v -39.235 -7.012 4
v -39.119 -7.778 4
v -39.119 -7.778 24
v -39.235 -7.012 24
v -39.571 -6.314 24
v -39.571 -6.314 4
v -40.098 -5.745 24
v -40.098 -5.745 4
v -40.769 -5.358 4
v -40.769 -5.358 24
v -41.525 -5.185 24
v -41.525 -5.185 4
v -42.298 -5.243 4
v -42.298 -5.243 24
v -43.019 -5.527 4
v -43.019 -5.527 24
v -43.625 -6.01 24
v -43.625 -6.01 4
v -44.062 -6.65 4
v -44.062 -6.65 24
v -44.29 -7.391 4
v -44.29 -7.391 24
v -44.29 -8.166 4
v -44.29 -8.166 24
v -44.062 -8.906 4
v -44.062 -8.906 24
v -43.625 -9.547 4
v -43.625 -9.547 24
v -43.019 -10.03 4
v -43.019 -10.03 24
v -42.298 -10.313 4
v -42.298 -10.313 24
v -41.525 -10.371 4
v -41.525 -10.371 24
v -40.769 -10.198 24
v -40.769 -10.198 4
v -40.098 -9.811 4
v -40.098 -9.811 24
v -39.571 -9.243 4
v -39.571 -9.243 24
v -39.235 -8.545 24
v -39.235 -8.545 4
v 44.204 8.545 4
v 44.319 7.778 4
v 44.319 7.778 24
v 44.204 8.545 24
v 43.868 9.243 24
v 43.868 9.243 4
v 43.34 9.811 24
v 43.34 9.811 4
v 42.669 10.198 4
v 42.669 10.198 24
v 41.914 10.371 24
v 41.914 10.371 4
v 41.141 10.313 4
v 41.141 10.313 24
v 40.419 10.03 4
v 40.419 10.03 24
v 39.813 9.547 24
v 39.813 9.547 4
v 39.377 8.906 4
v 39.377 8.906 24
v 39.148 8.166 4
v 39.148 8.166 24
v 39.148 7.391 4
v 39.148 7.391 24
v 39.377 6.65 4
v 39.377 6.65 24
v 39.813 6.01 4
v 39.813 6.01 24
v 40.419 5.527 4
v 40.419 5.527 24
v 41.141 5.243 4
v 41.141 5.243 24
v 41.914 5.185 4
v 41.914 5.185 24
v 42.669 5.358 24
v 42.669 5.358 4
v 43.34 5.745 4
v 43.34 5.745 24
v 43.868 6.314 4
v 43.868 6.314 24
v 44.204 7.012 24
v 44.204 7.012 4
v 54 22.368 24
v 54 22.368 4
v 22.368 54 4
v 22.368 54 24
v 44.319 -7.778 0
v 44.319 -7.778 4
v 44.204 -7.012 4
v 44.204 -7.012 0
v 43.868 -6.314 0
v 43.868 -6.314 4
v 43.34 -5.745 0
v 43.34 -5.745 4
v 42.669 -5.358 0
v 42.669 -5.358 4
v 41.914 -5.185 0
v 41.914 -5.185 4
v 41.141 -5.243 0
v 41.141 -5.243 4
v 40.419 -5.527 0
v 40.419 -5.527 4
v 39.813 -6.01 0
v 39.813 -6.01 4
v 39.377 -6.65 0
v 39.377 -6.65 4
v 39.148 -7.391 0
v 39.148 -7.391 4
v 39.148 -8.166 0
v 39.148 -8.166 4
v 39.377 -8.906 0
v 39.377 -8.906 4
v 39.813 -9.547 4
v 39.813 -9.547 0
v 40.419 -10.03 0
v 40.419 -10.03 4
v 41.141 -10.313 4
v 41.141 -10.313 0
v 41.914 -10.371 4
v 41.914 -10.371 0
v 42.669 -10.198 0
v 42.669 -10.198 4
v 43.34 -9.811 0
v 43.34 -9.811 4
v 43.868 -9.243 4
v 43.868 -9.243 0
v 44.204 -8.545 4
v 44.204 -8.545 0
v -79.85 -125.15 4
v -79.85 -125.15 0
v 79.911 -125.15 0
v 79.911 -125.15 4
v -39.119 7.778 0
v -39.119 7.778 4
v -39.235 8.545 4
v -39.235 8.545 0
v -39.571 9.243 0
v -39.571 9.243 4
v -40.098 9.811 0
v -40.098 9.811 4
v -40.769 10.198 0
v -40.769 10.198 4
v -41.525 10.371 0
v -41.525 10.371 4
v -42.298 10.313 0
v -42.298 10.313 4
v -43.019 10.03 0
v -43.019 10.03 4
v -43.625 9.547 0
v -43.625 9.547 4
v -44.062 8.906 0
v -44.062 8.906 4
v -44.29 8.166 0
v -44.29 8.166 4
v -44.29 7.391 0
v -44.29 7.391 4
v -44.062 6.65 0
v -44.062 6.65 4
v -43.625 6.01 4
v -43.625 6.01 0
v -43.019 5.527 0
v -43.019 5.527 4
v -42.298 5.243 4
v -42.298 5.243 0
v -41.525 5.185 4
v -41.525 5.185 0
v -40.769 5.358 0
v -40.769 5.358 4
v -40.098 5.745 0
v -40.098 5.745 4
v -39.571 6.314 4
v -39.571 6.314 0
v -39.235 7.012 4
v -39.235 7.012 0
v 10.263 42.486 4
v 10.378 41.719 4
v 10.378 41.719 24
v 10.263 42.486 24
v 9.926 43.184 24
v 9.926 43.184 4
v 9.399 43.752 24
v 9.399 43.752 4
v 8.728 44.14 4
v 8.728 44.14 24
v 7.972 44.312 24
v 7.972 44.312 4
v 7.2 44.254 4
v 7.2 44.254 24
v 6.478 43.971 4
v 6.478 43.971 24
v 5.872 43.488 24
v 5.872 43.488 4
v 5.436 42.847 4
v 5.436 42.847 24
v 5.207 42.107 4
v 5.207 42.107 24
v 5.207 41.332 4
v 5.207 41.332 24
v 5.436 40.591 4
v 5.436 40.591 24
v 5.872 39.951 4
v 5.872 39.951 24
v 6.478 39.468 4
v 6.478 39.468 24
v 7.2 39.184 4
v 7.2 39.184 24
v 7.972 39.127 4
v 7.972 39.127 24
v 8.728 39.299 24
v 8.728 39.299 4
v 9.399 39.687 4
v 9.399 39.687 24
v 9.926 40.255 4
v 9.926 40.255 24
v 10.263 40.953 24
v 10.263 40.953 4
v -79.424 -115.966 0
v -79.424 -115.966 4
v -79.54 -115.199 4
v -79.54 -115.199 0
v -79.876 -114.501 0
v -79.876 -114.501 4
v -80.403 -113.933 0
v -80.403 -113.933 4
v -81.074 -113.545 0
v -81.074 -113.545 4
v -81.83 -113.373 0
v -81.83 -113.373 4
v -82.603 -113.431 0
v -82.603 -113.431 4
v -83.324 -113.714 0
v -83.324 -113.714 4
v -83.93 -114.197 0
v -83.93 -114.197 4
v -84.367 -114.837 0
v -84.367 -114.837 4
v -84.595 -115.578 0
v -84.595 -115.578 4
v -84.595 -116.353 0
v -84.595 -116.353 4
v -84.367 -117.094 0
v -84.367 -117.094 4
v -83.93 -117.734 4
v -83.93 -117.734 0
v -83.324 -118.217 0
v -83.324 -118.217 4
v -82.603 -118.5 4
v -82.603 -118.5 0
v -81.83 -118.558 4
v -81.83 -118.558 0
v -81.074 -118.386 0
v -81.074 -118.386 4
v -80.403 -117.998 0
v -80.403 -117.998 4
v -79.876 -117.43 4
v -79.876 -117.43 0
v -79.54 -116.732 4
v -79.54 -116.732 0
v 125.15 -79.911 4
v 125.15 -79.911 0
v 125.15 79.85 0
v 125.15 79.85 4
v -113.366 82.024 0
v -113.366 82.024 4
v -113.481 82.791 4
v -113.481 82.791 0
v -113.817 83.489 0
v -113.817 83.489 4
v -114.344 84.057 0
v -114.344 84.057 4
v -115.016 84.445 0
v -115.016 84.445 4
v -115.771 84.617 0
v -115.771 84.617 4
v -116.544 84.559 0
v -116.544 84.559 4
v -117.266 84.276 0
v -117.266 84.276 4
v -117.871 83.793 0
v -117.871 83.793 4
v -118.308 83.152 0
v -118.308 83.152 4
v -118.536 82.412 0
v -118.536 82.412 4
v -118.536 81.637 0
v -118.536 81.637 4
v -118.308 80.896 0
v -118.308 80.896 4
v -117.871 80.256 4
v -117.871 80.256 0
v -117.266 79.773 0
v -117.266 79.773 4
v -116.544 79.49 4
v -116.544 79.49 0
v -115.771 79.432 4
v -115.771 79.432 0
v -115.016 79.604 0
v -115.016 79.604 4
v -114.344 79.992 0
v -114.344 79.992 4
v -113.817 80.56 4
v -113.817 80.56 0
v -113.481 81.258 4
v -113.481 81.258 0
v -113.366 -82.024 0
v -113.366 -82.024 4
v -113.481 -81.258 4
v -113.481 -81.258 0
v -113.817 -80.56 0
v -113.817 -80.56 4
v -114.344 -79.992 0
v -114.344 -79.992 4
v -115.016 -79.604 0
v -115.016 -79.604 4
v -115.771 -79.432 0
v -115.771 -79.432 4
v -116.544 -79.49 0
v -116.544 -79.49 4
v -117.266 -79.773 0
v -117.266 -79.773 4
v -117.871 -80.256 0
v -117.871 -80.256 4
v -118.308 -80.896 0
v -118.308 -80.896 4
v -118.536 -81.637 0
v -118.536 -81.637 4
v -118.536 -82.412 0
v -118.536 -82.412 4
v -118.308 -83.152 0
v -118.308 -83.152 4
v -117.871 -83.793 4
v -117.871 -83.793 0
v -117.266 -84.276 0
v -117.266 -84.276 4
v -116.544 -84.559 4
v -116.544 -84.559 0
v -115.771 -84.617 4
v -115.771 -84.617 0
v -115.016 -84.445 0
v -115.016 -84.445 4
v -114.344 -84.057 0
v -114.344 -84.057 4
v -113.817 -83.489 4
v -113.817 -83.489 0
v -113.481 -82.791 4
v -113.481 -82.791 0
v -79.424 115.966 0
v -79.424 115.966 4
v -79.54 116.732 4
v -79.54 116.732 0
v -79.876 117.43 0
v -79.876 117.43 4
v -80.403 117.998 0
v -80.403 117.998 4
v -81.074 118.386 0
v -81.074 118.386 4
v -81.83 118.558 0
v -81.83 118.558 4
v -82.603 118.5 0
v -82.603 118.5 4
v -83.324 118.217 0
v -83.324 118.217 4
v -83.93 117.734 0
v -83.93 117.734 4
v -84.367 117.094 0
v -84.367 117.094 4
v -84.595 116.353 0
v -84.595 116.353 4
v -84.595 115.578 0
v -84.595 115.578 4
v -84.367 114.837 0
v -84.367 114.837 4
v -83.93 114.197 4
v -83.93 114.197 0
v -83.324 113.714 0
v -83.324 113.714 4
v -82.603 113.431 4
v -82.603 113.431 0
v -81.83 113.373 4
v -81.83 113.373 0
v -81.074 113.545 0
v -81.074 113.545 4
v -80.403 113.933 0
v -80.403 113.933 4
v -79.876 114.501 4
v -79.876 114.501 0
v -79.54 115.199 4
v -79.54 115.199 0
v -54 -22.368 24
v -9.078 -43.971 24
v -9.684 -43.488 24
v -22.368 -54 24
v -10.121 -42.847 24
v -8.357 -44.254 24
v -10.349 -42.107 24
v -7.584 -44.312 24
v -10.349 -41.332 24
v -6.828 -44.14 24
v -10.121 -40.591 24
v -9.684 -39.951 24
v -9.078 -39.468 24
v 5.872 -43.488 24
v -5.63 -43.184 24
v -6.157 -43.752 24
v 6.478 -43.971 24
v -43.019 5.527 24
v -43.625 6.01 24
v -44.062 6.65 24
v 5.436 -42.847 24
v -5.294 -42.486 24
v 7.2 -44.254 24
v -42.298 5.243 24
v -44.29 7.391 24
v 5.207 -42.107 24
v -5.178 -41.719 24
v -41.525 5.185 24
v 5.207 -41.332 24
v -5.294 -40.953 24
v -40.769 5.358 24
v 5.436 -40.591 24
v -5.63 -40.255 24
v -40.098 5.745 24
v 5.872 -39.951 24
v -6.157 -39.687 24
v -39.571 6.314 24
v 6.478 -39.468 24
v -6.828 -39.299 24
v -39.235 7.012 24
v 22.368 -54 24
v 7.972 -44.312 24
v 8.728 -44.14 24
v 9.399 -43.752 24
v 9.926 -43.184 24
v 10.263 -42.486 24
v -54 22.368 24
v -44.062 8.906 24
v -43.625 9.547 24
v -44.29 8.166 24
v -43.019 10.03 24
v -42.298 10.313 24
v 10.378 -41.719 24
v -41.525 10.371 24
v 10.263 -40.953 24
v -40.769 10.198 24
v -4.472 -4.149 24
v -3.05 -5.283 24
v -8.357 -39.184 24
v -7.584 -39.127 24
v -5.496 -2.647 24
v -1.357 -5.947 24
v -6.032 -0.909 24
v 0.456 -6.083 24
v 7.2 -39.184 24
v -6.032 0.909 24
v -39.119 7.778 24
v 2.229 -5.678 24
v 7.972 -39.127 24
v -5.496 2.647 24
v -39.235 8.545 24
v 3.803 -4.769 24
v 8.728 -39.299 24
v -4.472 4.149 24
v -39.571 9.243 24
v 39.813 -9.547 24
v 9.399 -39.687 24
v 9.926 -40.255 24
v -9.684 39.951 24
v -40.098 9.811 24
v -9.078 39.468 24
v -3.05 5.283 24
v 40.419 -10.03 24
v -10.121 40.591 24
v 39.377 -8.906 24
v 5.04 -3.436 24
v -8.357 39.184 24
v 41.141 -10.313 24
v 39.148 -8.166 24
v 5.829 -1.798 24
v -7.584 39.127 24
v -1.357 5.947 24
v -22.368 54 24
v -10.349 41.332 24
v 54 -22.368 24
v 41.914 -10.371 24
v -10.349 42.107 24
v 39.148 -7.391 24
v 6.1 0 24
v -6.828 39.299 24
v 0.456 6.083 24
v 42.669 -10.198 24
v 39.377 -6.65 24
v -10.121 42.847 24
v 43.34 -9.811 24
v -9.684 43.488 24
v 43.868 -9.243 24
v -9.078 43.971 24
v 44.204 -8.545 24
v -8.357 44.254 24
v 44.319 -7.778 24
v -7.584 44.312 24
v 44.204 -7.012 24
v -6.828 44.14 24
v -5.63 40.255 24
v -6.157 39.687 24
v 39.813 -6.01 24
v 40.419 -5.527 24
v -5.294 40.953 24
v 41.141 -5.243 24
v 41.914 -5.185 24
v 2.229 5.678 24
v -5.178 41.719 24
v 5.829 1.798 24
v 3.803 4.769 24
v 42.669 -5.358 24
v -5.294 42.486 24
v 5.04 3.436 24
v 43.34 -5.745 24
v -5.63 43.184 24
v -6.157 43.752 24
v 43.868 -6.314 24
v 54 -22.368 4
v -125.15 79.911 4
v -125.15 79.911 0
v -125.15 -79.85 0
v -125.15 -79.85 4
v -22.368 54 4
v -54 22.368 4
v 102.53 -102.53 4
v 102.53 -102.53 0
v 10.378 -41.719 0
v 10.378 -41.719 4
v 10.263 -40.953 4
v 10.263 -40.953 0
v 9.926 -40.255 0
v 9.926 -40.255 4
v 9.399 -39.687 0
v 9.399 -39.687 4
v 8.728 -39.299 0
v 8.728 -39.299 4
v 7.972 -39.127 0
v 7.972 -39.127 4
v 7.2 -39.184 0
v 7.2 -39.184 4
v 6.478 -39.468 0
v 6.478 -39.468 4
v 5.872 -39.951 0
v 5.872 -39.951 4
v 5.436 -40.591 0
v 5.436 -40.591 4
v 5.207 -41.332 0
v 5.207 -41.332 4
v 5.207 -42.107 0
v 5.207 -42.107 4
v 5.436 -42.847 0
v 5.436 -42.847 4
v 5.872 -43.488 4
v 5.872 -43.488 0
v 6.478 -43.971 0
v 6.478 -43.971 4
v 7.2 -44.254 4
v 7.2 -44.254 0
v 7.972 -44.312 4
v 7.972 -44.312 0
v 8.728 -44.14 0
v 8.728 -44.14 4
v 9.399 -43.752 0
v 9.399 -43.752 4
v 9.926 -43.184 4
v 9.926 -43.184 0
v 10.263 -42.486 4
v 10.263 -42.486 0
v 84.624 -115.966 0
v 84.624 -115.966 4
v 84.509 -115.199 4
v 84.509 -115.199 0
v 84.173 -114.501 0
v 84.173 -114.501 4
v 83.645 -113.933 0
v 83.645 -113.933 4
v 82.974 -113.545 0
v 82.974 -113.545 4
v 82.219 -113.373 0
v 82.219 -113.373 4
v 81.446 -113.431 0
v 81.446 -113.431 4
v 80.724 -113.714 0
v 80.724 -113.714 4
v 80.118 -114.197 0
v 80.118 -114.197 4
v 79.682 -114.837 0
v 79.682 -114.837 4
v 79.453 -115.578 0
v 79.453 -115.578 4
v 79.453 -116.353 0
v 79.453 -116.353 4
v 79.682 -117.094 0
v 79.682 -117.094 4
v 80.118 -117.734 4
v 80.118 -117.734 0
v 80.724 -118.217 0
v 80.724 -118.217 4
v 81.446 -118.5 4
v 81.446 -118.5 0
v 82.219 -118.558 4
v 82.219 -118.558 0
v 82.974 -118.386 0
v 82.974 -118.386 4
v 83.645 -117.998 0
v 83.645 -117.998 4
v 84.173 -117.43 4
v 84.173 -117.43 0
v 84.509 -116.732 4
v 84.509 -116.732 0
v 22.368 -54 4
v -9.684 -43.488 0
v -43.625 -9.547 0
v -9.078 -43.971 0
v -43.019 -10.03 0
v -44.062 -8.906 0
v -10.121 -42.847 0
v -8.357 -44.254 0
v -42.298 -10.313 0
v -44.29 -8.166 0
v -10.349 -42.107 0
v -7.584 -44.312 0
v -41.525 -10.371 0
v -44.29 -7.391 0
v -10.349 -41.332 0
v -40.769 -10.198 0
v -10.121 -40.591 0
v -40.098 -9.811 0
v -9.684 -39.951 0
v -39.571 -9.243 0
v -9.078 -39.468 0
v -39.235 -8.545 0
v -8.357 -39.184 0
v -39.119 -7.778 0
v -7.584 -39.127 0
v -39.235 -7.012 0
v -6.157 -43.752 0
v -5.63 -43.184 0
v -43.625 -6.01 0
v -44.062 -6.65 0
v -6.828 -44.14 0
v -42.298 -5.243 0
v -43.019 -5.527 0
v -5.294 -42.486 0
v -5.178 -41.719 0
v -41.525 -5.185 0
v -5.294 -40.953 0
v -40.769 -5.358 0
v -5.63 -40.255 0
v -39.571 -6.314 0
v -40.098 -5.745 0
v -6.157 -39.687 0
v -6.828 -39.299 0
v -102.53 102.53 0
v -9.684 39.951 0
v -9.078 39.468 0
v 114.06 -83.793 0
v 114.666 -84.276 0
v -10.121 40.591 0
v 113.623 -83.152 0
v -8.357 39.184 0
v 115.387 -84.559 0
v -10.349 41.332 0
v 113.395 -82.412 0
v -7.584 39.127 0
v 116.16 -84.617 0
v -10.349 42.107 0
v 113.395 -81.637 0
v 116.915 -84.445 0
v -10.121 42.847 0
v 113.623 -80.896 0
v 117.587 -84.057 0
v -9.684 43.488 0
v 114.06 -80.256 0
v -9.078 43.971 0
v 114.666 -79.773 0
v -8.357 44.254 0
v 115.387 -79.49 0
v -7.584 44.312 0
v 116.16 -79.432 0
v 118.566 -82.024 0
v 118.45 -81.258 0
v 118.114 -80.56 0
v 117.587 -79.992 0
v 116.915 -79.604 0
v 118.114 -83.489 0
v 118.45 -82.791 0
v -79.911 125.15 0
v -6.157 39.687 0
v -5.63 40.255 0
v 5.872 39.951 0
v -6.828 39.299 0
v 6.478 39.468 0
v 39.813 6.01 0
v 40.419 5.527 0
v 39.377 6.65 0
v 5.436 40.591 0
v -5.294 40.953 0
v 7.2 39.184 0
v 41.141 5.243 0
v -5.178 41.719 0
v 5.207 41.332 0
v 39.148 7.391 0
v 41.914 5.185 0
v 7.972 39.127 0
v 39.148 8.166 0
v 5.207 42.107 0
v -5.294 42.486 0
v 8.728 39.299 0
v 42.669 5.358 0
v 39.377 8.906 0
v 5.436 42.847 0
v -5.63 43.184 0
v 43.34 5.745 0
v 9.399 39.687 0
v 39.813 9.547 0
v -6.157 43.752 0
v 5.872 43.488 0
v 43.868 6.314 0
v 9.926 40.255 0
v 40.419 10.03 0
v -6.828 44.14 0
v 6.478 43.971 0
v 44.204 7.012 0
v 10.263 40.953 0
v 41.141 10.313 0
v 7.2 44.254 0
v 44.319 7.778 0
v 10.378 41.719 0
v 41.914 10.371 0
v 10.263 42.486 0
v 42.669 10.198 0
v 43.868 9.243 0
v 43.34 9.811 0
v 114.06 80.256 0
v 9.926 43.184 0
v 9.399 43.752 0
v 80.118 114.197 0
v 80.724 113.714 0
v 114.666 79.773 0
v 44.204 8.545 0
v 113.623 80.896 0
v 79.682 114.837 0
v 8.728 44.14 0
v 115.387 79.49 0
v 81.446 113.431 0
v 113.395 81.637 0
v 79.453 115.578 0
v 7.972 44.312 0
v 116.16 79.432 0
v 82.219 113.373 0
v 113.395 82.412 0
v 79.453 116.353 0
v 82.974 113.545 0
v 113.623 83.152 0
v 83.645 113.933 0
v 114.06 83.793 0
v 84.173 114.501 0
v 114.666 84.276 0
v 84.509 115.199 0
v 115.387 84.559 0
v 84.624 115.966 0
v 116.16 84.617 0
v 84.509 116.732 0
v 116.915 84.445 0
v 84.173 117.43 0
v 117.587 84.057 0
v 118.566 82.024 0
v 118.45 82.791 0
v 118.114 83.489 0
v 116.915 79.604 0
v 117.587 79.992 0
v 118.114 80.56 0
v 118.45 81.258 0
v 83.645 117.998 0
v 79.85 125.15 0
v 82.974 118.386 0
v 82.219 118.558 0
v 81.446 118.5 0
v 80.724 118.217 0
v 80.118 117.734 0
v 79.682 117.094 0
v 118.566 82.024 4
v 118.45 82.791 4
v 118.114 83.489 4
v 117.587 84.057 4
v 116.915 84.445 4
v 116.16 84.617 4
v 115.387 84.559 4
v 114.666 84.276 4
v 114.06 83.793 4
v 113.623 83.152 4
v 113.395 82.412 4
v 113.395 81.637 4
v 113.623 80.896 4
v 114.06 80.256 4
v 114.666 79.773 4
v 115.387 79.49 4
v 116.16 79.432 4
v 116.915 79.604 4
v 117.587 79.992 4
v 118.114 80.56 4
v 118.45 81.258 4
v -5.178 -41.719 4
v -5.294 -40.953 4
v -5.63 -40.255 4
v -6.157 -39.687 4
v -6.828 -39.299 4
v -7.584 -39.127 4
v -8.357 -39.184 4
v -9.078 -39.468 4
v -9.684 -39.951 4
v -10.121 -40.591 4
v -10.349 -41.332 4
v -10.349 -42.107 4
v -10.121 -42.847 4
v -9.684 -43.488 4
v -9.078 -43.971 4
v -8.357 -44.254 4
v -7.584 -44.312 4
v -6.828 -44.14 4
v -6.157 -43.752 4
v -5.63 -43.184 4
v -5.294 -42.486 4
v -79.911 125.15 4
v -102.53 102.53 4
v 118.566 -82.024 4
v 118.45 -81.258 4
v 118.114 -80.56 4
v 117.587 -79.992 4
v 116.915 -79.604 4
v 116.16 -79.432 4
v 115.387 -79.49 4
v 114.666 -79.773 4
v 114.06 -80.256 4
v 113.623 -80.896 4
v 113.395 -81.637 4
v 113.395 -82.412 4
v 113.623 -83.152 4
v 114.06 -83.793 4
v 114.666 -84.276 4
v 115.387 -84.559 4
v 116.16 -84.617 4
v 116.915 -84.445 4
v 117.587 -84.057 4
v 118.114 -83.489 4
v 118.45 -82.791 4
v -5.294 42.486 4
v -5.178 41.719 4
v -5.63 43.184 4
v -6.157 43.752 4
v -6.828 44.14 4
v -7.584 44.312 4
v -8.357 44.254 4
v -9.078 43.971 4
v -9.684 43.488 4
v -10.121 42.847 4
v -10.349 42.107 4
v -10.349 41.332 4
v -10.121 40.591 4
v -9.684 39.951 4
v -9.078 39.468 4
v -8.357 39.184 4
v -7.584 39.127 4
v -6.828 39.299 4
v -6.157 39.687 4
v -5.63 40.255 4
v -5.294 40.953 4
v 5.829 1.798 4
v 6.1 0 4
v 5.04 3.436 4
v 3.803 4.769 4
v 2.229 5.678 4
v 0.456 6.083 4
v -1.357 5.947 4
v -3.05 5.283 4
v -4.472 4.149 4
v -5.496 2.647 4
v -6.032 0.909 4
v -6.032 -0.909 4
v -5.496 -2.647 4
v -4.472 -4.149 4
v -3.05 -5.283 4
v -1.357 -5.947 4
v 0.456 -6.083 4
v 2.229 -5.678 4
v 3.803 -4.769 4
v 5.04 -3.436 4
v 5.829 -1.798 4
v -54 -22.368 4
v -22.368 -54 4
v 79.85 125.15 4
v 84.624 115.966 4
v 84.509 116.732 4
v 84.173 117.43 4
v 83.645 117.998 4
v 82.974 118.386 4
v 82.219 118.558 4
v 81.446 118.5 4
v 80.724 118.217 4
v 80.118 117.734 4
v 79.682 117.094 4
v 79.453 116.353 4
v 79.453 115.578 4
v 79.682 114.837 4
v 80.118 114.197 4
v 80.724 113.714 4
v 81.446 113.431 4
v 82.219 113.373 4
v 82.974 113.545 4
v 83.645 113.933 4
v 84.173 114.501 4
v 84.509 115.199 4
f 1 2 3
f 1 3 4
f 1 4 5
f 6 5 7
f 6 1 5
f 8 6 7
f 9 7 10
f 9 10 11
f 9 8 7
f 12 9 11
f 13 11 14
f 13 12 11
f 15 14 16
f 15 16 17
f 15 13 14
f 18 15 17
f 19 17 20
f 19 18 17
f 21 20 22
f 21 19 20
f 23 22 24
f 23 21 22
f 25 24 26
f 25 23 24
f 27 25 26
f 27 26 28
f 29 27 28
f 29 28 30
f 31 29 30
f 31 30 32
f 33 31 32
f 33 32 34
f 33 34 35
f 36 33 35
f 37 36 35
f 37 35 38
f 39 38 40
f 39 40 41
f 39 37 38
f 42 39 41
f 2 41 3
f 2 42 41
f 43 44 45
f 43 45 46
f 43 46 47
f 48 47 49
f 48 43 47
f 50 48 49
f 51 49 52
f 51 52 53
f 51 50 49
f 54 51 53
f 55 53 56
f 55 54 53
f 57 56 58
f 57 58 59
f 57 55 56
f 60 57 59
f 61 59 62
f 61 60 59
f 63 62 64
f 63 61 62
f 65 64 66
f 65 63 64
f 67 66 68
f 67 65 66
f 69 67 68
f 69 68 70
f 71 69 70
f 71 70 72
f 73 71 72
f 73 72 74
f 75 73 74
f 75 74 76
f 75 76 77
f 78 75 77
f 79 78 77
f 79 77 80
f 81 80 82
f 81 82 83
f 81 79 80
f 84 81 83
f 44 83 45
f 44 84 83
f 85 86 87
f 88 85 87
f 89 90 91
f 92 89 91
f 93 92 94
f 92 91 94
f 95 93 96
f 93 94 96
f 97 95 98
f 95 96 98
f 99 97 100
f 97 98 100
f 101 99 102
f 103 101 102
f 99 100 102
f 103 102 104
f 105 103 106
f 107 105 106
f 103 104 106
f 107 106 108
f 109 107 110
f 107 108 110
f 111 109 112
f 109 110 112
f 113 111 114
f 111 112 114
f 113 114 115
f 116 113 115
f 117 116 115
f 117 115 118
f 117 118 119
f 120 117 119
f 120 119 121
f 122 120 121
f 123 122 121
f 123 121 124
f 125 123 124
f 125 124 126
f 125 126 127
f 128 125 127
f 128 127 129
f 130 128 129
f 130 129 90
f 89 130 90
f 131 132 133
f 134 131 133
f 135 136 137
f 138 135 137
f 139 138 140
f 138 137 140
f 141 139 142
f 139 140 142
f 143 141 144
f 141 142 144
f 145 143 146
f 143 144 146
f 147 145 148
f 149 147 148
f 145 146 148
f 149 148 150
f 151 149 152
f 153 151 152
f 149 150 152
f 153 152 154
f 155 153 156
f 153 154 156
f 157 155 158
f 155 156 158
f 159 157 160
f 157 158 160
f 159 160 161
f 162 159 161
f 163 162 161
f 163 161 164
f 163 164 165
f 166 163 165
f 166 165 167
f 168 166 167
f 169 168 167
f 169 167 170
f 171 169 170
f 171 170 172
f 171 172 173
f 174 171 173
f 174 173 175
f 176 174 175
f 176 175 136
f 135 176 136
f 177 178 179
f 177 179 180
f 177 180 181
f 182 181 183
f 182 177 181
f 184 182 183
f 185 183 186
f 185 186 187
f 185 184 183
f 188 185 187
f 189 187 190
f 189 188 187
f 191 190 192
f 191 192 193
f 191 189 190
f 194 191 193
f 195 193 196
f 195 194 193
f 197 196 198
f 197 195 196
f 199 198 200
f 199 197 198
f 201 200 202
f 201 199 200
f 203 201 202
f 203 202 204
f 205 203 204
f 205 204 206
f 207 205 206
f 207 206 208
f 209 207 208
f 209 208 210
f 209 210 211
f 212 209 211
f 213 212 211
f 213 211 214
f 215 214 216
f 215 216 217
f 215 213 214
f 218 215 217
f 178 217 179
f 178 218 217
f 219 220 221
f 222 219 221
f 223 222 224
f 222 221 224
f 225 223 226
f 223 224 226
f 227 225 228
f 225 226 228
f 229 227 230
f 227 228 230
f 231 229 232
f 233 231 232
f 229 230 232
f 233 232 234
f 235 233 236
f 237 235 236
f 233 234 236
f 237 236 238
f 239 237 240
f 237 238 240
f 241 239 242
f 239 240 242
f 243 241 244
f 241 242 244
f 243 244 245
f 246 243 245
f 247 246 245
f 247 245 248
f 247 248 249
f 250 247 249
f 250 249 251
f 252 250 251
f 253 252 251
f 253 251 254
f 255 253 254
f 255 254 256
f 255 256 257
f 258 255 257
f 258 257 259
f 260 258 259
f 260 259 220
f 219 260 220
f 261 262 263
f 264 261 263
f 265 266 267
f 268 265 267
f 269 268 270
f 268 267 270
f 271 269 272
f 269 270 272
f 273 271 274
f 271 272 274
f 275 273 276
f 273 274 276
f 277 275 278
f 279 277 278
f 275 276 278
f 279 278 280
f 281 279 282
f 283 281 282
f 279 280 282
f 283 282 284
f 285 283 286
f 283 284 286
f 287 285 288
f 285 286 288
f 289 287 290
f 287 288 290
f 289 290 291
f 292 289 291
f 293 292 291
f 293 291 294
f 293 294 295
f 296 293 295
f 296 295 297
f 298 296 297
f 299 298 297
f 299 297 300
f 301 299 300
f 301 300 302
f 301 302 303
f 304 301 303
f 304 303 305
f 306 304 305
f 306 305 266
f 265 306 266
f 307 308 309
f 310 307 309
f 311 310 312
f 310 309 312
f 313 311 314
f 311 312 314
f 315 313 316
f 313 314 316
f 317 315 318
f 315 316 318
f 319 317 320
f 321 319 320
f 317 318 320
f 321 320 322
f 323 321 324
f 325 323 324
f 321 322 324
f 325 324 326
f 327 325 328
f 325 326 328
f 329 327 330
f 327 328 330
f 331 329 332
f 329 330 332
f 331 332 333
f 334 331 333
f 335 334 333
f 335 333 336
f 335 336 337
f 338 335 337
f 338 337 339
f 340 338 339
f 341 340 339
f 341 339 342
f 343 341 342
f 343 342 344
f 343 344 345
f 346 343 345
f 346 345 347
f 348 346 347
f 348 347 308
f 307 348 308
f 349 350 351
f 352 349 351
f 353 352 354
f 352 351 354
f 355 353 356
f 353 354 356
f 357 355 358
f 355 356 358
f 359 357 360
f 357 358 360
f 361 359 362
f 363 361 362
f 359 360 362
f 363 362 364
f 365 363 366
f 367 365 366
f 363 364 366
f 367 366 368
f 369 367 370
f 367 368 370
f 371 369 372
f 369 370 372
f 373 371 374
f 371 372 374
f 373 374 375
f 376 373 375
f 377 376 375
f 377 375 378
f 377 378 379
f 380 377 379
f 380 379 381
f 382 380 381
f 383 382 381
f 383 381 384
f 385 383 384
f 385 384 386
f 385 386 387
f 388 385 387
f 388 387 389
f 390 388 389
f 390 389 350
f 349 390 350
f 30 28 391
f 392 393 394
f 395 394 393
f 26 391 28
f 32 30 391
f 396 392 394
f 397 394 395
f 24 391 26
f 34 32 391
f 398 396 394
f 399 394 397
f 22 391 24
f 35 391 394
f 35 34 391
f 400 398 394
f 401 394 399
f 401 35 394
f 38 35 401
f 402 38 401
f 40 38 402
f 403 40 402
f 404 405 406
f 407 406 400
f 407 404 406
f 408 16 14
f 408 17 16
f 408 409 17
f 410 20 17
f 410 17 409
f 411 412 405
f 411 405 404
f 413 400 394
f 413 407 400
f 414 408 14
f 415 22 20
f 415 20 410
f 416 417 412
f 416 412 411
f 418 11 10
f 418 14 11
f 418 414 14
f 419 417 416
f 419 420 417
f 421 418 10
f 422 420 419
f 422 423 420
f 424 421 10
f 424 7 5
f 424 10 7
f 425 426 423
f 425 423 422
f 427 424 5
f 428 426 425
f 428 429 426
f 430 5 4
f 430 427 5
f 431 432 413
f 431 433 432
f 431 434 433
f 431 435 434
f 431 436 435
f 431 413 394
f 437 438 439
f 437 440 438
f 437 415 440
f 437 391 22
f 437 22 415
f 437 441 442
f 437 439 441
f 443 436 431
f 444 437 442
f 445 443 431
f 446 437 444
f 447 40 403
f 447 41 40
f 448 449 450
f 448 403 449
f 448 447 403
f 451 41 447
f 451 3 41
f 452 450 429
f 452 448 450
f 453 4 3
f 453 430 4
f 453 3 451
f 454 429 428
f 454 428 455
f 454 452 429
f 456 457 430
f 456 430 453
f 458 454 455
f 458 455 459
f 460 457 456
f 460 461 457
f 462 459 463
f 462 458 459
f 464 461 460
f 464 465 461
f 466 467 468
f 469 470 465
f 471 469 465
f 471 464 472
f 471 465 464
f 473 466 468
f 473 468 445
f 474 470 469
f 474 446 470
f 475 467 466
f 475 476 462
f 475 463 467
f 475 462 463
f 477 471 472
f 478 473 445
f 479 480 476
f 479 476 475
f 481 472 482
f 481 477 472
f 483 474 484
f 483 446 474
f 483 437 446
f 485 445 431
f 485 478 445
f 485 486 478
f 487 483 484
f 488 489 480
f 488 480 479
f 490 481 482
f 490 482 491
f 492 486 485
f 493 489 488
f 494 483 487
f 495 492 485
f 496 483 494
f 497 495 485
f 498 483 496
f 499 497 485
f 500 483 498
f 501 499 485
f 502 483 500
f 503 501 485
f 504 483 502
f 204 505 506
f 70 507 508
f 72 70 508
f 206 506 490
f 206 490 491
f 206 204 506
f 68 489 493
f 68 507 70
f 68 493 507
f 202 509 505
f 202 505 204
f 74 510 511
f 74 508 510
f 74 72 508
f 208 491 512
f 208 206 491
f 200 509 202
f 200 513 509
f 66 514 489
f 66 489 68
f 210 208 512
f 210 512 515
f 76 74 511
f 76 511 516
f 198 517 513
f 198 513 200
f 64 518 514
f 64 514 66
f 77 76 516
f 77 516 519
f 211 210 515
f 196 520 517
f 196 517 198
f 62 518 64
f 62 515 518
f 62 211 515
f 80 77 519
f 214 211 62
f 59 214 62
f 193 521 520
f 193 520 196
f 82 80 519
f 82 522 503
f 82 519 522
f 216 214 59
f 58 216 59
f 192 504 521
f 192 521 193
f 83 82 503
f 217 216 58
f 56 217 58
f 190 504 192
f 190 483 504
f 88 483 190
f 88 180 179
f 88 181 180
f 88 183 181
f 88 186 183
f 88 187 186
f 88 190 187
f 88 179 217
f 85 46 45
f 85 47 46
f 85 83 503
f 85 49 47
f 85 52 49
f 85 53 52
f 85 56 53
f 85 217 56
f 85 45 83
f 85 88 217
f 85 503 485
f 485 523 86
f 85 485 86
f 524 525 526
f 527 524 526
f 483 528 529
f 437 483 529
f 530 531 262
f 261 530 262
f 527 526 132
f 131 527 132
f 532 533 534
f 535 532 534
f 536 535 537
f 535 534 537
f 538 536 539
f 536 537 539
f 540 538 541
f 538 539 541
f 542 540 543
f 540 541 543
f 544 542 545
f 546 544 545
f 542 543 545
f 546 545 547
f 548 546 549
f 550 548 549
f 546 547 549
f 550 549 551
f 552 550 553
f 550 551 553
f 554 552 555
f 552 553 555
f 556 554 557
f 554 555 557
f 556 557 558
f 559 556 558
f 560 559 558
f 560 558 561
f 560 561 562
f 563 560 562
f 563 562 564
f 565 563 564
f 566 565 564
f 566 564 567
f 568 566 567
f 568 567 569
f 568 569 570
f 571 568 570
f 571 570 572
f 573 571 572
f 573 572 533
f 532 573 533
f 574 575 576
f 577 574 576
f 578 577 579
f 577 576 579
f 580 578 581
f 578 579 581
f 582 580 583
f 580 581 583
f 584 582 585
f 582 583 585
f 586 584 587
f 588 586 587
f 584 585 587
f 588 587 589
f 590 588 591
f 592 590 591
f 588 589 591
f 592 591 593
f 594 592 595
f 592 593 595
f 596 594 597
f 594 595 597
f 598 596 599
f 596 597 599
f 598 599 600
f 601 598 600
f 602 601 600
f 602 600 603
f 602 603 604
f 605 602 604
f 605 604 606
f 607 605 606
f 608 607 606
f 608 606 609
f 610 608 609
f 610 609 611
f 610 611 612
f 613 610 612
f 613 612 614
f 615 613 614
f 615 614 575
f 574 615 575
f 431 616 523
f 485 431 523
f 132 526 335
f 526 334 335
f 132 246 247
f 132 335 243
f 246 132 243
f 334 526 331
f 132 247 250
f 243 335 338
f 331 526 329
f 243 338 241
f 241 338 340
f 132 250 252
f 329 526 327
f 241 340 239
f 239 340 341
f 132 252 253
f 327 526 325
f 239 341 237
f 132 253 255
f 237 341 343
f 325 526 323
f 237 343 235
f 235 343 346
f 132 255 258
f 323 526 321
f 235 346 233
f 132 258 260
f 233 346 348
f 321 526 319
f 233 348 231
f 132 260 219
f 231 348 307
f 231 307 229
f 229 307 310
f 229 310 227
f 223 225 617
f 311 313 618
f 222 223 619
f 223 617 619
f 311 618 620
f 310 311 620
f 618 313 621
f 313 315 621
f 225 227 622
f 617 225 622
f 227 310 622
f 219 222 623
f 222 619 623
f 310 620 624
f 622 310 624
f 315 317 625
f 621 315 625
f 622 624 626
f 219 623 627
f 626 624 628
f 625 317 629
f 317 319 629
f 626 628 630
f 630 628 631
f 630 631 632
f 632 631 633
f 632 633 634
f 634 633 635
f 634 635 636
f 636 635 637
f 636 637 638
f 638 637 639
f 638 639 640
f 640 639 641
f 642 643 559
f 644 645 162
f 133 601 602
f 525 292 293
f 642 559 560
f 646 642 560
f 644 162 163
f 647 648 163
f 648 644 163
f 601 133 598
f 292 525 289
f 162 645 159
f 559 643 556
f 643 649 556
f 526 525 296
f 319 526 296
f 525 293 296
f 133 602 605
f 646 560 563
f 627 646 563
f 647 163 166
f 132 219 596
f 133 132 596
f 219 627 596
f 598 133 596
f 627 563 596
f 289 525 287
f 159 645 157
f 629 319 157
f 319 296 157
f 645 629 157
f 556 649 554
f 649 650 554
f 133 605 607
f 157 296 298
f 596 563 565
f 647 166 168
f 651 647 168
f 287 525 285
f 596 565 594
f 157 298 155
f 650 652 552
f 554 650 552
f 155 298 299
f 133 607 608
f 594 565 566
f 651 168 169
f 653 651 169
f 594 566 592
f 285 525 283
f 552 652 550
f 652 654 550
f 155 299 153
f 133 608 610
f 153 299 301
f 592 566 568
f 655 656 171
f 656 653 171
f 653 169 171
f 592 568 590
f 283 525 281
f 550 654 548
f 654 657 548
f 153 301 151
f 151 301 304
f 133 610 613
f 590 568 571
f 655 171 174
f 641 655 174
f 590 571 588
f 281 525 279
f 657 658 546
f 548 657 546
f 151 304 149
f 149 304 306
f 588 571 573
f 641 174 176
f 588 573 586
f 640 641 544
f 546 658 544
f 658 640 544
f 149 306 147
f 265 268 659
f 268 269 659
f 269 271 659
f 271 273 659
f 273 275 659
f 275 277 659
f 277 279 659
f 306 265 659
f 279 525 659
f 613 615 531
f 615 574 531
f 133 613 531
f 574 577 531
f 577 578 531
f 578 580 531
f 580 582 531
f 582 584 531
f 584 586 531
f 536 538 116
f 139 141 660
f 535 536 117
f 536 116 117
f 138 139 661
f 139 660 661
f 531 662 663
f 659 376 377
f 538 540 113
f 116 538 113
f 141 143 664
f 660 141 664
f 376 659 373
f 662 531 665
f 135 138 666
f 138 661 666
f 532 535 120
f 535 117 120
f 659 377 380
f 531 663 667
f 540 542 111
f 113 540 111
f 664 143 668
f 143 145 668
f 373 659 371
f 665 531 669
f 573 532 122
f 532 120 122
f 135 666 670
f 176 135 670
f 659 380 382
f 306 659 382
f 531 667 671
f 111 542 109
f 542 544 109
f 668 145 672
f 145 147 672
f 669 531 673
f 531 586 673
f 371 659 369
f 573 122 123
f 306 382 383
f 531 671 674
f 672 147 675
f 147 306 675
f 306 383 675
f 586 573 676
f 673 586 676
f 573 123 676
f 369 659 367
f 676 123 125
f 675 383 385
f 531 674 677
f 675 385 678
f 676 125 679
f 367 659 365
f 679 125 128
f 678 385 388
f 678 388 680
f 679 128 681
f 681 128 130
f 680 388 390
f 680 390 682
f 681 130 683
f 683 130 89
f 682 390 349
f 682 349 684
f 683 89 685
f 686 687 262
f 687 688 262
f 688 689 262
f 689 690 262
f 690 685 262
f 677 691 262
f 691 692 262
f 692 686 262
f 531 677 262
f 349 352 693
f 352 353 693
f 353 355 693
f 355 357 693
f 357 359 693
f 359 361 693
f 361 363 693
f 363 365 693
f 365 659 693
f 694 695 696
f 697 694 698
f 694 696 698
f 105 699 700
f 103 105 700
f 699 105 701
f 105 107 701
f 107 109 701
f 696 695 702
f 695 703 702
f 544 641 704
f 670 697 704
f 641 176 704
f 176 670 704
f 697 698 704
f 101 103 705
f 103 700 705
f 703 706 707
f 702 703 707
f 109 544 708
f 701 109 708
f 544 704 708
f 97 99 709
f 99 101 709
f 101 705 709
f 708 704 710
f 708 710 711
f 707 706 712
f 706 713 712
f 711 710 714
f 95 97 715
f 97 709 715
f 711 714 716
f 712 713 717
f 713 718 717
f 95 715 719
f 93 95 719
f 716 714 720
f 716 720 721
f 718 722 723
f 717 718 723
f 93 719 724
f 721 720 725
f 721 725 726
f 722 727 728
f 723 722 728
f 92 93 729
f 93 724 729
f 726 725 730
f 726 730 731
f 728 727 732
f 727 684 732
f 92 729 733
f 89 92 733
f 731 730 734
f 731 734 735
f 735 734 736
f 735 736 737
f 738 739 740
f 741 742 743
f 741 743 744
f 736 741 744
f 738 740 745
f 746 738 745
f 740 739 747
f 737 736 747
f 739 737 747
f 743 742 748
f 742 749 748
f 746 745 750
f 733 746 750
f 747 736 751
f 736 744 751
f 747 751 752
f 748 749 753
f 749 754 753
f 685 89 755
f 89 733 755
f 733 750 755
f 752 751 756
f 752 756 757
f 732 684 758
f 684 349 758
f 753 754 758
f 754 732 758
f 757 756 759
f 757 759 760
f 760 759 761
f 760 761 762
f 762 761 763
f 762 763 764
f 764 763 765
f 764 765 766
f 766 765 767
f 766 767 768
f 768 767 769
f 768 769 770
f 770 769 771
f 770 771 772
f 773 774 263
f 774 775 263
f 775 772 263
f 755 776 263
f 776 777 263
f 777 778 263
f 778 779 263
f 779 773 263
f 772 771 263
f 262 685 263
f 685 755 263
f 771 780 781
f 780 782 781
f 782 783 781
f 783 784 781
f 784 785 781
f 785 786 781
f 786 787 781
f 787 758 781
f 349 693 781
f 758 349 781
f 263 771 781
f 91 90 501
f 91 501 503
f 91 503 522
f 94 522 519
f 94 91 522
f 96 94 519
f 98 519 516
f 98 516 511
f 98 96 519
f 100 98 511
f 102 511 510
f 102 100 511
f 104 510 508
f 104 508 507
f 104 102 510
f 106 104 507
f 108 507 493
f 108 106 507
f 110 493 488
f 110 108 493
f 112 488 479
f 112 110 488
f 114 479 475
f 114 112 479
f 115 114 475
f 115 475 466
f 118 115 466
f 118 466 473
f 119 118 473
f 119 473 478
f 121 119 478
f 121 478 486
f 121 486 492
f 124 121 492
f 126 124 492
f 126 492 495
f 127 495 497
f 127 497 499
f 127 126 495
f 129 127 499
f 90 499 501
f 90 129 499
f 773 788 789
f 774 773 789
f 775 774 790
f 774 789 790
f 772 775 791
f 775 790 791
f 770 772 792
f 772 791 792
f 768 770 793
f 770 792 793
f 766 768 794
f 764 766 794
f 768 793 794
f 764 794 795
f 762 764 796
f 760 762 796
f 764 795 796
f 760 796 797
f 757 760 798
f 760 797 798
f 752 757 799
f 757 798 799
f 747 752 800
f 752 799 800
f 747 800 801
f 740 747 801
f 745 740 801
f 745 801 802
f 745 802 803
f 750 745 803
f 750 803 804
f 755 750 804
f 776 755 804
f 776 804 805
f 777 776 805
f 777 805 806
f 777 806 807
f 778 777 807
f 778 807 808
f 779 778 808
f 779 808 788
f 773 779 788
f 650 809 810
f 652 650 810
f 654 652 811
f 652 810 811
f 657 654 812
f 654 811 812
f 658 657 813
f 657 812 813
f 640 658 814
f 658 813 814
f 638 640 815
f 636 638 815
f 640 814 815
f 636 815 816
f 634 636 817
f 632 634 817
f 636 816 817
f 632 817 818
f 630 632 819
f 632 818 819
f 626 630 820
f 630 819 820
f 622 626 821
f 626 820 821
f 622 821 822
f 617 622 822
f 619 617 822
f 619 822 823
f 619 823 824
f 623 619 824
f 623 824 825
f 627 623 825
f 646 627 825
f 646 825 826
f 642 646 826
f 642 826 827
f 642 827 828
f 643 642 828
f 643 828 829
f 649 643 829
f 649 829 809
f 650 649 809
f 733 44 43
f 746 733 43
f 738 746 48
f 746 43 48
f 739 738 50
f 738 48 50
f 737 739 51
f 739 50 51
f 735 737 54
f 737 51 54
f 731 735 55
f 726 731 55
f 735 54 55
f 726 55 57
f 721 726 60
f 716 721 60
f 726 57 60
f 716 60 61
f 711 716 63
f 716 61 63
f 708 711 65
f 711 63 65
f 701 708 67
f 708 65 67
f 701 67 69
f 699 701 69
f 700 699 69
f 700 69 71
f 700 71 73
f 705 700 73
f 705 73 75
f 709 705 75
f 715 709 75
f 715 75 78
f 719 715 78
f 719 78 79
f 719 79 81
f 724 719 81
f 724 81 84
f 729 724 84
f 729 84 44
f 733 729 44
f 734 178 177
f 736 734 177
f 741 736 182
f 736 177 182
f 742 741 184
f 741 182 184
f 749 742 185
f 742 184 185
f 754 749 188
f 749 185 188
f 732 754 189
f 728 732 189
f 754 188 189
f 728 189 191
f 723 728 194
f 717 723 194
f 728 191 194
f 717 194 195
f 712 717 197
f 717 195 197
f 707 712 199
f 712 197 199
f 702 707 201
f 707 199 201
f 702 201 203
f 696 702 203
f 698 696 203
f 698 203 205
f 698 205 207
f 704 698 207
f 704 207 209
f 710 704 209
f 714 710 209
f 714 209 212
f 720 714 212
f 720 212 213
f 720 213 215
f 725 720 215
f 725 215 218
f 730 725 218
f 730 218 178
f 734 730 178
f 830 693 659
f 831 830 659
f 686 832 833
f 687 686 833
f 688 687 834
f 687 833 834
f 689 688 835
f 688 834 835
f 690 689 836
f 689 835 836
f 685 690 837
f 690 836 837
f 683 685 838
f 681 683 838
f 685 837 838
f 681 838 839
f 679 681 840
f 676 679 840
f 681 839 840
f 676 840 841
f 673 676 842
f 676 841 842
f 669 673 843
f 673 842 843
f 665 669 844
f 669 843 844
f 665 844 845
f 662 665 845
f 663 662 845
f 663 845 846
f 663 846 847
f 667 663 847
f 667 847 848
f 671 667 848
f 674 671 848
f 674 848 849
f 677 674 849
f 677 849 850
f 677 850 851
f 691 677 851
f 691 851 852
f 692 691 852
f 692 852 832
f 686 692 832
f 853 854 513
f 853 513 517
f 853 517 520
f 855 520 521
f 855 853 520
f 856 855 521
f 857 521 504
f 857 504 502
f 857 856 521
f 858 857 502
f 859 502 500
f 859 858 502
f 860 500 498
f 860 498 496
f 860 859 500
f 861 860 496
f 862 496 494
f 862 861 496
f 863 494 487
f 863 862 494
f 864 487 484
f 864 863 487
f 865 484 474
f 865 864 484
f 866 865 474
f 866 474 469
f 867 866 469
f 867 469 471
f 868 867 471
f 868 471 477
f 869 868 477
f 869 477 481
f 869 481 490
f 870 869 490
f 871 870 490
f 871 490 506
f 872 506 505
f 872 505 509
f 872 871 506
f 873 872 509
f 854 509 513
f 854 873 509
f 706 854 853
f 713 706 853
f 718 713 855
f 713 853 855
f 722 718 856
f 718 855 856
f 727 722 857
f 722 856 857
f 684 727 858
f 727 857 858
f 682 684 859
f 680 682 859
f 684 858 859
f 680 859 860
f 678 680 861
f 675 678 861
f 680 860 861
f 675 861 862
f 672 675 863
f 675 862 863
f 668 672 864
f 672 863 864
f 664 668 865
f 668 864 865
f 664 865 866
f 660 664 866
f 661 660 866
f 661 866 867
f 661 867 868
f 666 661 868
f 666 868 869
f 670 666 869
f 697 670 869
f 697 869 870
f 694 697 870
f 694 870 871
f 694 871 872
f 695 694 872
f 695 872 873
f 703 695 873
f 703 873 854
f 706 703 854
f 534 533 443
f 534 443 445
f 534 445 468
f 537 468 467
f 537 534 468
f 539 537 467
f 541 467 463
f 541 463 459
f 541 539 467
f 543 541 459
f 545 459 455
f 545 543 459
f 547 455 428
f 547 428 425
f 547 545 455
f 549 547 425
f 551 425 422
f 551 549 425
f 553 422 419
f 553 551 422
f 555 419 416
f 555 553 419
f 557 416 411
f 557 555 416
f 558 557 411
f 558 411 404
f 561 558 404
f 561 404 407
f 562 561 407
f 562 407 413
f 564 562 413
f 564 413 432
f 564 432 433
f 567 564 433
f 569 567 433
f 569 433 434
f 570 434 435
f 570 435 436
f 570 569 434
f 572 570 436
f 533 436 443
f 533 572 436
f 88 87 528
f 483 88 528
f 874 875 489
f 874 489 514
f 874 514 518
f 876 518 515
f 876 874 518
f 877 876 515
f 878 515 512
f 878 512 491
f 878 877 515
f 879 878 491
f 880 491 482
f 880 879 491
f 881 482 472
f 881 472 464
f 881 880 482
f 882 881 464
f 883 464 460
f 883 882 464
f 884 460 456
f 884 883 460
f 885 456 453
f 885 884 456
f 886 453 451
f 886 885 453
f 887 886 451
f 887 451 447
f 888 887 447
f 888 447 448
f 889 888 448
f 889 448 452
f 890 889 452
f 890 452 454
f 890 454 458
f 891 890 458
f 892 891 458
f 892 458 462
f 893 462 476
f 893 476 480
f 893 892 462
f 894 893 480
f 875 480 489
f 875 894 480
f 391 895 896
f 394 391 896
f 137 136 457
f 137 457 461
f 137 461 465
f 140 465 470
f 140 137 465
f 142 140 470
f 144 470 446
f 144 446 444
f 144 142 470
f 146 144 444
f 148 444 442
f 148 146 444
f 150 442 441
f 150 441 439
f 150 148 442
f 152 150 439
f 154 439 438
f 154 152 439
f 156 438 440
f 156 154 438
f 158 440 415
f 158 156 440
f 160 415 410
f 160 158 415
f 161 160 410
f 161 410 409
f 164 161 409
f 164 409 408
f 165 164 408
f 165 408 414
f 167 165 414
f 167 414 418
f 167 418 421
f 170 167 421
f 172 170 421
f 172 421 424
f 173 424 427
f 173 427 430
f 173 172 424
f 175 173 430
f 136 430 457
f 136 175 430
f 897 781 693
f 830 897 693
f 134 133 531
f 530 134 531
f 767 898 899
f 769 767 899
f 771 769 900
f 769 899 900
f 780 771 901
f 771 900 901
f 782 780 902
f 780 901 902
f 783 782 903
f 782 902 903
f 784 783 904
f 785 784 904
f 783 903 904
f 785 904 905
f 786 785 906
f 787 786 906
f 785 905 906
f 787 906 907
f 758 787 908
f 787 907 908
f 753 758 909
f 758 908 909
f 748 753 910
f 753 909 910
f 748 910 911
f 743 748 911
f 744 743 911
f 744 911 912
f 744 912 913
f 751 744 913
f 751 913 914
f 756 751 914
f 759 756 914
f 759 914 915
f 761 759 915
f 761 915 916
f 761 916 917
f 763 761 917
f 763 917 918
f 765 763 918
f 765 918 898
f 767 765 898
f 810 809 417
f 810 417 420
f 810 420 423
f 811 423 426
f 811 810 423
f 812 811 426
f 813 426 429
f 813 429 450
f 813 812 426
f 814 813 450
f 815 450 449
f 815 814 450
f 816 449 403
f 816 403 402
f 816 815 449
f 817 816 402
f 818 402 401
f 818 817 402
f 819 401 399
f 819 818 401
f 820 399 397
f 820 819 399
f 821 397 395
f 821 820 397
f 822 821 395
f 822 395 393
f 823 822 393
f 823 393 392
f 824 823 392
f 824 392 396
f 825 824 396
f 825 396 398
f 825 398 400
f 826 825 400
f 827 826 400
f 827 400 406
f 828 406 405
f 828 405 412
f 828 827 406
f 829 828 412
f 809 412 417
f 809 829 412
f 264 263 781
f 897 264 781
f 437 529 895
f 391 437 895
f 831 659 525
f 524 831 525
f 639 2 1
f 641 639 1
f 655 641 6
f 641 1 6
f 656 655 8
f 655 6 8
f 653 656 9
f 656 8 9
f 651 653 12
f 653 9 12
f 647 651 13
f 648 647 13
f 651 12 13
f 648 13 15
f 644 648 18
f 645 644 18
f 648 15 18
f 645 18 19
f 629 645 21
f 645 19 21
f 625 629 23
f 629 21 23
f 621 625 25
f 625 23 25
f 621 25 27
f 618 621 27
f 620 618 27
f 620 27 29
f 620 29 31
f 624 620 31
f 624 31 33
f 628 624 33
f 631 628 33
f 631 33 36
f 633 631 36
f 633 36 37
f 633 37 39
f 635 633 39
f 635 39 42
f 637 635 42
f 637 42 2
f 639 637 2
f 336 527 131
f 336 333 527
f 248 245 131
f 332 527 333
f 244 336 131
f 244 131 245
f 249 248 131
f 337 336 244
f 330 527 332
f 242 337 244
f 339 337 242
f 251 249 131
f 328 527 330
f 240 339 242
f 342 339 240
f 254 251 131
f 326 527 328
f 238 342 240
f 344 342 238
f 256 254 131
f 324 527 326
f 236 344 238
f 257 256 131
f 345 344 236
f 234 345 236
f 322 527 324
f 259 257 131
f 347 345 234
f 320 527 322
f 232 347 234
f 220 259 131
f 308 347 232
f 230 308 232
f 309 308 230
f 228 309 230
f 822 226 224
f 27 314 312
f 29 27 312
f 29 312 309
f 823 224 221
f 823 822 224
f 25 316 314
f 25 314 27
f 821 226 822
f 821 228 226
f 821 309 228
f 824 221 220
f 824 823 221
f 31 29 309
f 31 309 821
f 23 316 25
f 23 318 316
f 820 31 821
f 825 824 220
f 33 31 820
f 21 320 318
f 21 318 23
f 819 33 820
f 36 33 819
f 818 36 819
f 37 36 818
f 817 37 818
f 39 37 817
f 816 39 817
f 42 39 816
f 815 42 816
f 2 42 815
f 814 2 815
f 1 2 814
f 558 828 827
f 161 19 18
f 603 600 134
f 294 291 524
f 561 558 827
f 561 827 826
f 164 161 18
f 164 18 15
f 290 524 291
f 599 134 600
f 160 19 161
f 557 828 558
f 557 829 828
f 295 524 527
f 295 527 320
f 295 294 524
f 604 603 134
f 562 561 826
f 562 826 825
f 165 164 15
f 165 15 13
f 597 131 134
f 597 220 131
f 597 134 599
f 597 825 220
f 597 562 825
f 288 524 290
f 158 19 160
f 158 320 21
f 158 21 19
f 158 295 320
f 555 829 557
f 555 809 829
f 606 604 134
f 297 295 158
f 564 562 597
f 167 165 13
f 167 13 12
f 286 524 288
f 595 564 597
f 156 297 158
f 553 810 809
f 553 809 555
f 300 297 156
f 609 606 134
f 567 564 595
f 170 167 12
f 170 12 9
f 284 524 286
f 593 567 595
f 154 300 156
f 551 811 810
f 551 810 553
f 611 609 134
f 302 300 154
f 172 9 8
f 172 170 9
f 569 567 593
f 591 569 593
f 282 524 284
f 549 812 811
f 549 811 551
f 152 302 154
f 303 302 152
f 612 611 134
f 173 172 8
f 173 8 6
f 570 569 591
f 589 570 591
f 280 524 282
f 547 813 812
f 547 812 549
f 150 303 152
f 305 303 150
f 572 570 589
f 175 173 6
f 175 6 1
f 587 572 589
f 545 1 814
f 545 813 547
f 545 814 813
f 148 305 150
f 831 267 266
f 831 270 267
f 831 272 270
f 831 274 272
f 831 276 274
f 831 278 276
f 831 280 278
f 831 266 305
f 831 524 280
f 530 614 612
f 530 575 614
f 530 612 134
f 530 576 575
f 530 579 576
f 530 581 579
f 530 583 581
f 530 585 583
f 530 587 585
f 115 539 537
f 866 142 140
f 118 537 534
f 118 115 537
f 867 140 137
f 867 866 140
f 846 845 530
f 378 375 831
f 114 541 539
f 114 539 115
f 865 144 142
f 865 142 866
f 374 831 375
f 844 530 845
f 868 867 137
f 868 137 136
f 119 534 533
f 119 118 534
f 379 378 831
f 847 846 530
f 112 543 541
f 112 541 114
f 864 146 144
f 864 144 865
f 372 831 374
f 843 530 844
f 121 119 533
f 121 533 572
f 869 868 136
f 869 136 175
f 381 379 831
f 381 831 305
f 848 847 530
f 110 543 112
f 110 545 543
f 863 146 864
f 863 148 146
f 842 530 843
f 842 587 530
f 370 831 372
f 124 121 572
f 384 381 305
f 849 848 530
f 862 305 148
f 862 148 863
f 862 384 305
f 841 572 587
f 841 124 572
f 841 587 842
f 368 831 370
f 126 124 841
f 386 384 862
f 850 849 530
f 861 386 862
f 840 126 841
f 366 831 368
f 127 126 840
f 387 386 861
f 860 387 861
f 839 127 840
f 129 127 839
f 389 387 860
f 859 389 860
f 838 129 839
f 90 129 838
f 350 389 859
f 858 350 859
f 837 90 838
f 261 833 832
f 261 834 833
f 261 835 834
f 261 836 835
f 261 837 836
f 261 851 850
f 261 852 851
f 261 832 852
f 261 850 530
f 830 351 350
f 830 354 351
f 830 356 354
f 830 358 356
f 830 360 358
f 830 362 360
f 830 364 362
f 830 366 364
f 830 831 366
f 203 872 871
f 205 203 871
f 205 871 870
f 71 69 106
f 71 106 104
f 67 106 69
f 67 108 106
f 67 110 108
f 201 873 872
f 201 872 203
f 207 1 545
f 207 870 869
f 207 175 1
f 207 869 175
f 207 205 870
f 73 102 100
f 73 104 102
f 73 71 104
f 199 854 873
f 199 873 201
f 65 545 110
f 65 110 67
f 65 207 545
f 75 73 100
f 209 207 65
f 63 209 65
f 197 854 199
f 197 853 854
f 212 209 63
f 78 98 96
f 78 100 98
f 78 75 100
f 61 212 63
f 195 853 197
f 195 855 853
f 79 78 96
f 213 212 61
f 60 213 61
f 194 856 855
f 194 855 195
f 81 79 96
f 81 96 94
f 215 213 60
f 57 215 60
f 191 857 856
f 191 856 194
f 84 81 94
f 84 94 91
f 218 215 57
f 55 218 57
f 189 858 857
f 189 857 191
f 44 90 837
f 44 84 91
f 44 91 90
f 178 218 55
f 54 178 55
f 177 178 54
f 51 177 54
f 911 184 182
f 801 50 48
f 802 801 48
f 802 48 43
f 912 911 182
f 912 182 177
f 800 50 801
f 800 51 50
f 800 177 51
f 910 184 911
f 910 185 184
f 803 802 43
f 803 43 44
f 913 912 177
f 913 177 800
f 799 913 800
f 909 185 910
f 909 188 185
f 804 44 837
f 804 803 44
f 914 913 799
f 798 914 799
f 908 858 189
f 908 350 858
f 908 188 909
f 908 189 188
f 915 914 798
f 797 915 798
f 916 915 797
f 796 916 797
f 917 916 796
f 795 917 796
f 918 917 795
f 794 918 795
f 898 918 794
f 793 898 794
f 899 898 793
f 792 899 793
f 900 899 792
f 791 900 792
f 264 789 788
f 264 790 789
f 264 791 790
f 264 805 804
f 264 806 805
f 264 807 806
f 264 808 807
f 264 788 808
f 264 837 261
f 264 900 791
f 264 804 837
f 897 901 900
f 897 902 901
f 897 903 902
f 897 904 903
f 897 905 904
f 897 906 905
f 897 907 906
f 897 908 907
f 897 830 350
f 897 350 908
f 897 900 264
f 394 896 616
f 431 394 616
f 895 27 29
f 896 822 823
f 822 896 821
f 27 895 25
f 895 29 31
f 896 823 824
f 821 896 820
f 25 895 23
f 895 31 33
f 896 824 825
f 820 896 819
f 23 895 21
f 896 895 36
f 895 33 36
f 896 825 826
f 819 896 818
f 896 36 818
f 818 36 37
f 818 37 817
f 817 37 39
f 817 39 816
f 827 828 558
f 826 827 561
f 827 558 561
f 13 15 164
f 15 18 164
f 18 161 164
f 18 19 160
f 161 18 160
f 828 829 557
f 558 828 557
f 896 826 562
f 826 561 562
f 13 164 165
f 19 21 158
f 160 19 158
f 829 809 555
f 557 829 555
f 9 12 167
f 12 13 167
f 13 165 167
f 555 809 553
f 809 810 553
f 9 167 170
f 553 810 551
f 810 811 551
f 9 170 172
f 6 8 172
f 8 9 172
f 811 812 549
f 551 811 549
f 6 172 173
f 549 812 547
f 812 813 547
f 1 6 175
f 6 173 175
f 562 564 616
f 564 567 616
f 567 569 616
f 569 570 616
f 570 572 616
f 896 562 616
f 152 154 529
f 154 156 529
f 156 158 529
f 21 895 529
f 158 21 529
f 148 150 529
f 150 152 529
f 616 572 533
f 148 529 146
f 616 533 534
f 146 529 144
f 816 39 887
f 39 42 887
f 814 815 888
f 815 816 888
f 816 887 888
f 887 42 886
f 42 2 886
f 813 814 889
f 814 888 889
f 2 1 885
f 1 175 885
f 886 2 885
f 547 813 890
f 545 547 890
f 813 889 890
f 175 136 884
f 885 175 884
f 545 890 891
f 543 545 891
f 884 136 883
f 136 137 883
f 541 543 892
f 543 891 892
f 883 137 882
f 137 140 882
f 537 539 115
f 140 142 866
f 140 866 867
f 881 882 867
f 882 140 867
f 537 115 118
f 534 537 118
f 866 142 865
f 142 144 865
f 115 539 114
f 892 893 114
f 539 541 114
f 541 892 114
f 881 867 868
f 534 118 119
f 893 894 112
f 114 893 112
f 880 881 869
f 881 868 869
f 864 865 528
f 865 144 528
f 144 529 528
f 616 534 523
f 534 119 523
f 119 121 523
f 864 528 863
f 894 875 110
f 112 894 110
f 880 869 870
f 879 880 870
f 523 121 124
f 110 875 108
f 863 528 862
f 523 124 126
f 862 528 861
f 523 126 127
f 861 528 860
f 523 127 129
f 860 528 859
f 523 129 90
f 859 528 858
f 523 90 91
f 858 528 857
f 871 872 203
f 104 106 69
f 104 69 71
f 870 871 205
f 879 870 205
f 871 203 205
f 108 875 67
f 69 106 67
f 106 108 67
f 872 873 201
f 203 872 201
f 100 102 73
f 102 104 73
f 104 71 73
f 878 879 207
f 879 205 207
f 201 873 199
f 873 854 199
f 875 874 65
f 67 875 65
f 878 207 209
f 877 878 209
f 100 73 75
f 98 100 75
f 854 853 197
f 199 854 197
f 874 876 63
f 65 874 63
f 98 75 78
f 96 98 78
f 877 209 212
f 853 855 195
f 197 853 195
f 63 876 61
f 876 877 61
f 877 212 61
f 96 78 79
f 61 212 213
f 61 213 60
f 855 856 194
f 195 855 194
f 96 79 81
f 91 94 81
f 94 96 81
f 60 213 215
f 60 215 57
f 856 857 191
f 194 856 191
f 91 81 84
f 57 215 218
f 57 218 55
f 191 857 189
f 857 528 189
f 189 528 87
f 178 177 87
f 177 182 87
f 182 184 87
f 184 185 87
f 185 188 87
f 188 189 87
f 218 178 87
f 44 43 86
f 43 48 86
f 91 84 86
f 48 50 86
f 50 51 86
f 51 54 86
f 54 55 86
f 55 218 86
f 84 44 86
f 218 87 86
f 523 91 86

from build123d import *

# Parameters (mm, degrees)
F1_DEPTH = 4
F2_R     = 2.6
F3_DEPTH = 20
F4_R     = 2.6
F5_DEPTH = 4.001
F6_R     = 2.6
F6_R_2   = 6.1
F7_DEPTH = 20


# Not quite as in the source:
# - a feature names something its author has since deleted; it is built from what else it names


with BuildPart() as f1:
    # F0 (on Top) → F1 (new body)
    with BuildSketch(Plane.XY):
        Polygon((125.15, 79.85), (102.5, 102.5), (79.85, 125.15), (-79.9109665441, 125.15), (-102.530483272, 102.530483272), (-125.15, 79.9109665441), (-125.15, -79.85), (-102.5, -102.5), (-79.85, -125.15), (79.9109665441, -125.15), (102.530483272, -102.530483272), (125.15, -79.9109665441), align=None)
    extrude(amount=F1_DEPTH)

    # F2 (on face) → F3 (cut)
    with BuildSketch(Plane.XY.offset(4)):
        with Locations((-7.7781745931, 41.71930009)):
            Circle(F2_R)
        with Locations((-41.71930009, 7.7781745931)):
            Circle(F2_R)
        with Locations((7.7781745931, -41.71930009)):
            Circle(F2_R)
        with Locations((41.71930009, -7.7781745931)):
            Circle(F2_R)
        with Locations((41.71930009, 7.7781745931)):
            Circle(F2_R)
        with Locations((7.7781745931, 41.71930009)):
            Circle(F2_R)
        with Locations((-41.71930009, -7.7781745931)):
            Circle(F2_R)
        with Locations((-7.7781745931, -41.71930009)):
            Circle(F2_R)
    extrude(amount=-F3_DEPTH, mode=Mode.SUBTRACT)

    # F4 (on face) → F5 (cut, through all)
    with BuildSketch(Plane.XY.offset(4)):
        with Locations((-82.0243866176, 115.9655121146)):
            Circle(F4_R)
        with Locations((-115.9655121146, 82.0243866176)):
            Circle(F4_R)
        with Locations((82.0243866176, -115.9655121146)):
            Circle(F4_R)
        with Locations((115.9655121146, -82.0243866176)):
            Circle(F4_R)
        with Locations((82.0243866176, 115.9655121146)):
            Circle(F4_R)
        with Locations((115.9655121146, 82.0243866176)):
            Circle(F4_R)
        with Locations((-115.9655121146, -82.0243866176)):
            Circle(F4_R)
        with Locations((-82.0243866176, -115.9655121146)):
            Circle(F4_R)
    extrude(amount=-F5_DEPTH, mode=Mode.SUBTRACT)


with BuildPart() as f7:
    # F6 (on face) → F7 (new body)
    with BuildSketch(Plane.XY.offset(4)):
        Polygon((22.3675323681, 54), (-22.3675323681, 54), (-54, 22.3675323681), (-54, -22.3675323681), (-22.3675323681, -54), (22.3675323681, -54), (54, -22.3675323681), (54, 22.3675323681), align=None)
        with Locations((-7.7781745931, -41.71930009)):
            Circle(F6_R, mode=Mode.SUBTRACT)
        with Locations((-41.71930009, -7.7781745931)):
            Circle(F6_R, mode=Mode.SUBTRACT)
        with Locations((7.7781745931, -41.71930009)):
            Circle(F6_R, mode=Mode.SUBTRACT)
        with Locations((41.71930009, -7.7781745931)):
            Circle(F6_R, mode=Mode.SUBTRACT)
        with Locations((-41.71930009, 7.7781745931)):
            Circle(F6_R, mode=Mode.SUBTRACT)
        with Locations((-7.7781745931, 41.71930009)):
            Circle(F6_R, mode=Mode.SUBTRACT)
        Circle(F6_R_2, mode=Mode.SUBTRACT)
        with Locations((41.71930009, 7.7781745931)):
            Circle(F6_R, mode=Mode.SUBTRACT)
        with Locations((7.7781745931, 41.71930009)):
            Circle(F6_R, mode=Mode.SUBTRACT)
    extrude(amount=F7_DEPTH)


solid = Compound([f1.part, f7.part])
